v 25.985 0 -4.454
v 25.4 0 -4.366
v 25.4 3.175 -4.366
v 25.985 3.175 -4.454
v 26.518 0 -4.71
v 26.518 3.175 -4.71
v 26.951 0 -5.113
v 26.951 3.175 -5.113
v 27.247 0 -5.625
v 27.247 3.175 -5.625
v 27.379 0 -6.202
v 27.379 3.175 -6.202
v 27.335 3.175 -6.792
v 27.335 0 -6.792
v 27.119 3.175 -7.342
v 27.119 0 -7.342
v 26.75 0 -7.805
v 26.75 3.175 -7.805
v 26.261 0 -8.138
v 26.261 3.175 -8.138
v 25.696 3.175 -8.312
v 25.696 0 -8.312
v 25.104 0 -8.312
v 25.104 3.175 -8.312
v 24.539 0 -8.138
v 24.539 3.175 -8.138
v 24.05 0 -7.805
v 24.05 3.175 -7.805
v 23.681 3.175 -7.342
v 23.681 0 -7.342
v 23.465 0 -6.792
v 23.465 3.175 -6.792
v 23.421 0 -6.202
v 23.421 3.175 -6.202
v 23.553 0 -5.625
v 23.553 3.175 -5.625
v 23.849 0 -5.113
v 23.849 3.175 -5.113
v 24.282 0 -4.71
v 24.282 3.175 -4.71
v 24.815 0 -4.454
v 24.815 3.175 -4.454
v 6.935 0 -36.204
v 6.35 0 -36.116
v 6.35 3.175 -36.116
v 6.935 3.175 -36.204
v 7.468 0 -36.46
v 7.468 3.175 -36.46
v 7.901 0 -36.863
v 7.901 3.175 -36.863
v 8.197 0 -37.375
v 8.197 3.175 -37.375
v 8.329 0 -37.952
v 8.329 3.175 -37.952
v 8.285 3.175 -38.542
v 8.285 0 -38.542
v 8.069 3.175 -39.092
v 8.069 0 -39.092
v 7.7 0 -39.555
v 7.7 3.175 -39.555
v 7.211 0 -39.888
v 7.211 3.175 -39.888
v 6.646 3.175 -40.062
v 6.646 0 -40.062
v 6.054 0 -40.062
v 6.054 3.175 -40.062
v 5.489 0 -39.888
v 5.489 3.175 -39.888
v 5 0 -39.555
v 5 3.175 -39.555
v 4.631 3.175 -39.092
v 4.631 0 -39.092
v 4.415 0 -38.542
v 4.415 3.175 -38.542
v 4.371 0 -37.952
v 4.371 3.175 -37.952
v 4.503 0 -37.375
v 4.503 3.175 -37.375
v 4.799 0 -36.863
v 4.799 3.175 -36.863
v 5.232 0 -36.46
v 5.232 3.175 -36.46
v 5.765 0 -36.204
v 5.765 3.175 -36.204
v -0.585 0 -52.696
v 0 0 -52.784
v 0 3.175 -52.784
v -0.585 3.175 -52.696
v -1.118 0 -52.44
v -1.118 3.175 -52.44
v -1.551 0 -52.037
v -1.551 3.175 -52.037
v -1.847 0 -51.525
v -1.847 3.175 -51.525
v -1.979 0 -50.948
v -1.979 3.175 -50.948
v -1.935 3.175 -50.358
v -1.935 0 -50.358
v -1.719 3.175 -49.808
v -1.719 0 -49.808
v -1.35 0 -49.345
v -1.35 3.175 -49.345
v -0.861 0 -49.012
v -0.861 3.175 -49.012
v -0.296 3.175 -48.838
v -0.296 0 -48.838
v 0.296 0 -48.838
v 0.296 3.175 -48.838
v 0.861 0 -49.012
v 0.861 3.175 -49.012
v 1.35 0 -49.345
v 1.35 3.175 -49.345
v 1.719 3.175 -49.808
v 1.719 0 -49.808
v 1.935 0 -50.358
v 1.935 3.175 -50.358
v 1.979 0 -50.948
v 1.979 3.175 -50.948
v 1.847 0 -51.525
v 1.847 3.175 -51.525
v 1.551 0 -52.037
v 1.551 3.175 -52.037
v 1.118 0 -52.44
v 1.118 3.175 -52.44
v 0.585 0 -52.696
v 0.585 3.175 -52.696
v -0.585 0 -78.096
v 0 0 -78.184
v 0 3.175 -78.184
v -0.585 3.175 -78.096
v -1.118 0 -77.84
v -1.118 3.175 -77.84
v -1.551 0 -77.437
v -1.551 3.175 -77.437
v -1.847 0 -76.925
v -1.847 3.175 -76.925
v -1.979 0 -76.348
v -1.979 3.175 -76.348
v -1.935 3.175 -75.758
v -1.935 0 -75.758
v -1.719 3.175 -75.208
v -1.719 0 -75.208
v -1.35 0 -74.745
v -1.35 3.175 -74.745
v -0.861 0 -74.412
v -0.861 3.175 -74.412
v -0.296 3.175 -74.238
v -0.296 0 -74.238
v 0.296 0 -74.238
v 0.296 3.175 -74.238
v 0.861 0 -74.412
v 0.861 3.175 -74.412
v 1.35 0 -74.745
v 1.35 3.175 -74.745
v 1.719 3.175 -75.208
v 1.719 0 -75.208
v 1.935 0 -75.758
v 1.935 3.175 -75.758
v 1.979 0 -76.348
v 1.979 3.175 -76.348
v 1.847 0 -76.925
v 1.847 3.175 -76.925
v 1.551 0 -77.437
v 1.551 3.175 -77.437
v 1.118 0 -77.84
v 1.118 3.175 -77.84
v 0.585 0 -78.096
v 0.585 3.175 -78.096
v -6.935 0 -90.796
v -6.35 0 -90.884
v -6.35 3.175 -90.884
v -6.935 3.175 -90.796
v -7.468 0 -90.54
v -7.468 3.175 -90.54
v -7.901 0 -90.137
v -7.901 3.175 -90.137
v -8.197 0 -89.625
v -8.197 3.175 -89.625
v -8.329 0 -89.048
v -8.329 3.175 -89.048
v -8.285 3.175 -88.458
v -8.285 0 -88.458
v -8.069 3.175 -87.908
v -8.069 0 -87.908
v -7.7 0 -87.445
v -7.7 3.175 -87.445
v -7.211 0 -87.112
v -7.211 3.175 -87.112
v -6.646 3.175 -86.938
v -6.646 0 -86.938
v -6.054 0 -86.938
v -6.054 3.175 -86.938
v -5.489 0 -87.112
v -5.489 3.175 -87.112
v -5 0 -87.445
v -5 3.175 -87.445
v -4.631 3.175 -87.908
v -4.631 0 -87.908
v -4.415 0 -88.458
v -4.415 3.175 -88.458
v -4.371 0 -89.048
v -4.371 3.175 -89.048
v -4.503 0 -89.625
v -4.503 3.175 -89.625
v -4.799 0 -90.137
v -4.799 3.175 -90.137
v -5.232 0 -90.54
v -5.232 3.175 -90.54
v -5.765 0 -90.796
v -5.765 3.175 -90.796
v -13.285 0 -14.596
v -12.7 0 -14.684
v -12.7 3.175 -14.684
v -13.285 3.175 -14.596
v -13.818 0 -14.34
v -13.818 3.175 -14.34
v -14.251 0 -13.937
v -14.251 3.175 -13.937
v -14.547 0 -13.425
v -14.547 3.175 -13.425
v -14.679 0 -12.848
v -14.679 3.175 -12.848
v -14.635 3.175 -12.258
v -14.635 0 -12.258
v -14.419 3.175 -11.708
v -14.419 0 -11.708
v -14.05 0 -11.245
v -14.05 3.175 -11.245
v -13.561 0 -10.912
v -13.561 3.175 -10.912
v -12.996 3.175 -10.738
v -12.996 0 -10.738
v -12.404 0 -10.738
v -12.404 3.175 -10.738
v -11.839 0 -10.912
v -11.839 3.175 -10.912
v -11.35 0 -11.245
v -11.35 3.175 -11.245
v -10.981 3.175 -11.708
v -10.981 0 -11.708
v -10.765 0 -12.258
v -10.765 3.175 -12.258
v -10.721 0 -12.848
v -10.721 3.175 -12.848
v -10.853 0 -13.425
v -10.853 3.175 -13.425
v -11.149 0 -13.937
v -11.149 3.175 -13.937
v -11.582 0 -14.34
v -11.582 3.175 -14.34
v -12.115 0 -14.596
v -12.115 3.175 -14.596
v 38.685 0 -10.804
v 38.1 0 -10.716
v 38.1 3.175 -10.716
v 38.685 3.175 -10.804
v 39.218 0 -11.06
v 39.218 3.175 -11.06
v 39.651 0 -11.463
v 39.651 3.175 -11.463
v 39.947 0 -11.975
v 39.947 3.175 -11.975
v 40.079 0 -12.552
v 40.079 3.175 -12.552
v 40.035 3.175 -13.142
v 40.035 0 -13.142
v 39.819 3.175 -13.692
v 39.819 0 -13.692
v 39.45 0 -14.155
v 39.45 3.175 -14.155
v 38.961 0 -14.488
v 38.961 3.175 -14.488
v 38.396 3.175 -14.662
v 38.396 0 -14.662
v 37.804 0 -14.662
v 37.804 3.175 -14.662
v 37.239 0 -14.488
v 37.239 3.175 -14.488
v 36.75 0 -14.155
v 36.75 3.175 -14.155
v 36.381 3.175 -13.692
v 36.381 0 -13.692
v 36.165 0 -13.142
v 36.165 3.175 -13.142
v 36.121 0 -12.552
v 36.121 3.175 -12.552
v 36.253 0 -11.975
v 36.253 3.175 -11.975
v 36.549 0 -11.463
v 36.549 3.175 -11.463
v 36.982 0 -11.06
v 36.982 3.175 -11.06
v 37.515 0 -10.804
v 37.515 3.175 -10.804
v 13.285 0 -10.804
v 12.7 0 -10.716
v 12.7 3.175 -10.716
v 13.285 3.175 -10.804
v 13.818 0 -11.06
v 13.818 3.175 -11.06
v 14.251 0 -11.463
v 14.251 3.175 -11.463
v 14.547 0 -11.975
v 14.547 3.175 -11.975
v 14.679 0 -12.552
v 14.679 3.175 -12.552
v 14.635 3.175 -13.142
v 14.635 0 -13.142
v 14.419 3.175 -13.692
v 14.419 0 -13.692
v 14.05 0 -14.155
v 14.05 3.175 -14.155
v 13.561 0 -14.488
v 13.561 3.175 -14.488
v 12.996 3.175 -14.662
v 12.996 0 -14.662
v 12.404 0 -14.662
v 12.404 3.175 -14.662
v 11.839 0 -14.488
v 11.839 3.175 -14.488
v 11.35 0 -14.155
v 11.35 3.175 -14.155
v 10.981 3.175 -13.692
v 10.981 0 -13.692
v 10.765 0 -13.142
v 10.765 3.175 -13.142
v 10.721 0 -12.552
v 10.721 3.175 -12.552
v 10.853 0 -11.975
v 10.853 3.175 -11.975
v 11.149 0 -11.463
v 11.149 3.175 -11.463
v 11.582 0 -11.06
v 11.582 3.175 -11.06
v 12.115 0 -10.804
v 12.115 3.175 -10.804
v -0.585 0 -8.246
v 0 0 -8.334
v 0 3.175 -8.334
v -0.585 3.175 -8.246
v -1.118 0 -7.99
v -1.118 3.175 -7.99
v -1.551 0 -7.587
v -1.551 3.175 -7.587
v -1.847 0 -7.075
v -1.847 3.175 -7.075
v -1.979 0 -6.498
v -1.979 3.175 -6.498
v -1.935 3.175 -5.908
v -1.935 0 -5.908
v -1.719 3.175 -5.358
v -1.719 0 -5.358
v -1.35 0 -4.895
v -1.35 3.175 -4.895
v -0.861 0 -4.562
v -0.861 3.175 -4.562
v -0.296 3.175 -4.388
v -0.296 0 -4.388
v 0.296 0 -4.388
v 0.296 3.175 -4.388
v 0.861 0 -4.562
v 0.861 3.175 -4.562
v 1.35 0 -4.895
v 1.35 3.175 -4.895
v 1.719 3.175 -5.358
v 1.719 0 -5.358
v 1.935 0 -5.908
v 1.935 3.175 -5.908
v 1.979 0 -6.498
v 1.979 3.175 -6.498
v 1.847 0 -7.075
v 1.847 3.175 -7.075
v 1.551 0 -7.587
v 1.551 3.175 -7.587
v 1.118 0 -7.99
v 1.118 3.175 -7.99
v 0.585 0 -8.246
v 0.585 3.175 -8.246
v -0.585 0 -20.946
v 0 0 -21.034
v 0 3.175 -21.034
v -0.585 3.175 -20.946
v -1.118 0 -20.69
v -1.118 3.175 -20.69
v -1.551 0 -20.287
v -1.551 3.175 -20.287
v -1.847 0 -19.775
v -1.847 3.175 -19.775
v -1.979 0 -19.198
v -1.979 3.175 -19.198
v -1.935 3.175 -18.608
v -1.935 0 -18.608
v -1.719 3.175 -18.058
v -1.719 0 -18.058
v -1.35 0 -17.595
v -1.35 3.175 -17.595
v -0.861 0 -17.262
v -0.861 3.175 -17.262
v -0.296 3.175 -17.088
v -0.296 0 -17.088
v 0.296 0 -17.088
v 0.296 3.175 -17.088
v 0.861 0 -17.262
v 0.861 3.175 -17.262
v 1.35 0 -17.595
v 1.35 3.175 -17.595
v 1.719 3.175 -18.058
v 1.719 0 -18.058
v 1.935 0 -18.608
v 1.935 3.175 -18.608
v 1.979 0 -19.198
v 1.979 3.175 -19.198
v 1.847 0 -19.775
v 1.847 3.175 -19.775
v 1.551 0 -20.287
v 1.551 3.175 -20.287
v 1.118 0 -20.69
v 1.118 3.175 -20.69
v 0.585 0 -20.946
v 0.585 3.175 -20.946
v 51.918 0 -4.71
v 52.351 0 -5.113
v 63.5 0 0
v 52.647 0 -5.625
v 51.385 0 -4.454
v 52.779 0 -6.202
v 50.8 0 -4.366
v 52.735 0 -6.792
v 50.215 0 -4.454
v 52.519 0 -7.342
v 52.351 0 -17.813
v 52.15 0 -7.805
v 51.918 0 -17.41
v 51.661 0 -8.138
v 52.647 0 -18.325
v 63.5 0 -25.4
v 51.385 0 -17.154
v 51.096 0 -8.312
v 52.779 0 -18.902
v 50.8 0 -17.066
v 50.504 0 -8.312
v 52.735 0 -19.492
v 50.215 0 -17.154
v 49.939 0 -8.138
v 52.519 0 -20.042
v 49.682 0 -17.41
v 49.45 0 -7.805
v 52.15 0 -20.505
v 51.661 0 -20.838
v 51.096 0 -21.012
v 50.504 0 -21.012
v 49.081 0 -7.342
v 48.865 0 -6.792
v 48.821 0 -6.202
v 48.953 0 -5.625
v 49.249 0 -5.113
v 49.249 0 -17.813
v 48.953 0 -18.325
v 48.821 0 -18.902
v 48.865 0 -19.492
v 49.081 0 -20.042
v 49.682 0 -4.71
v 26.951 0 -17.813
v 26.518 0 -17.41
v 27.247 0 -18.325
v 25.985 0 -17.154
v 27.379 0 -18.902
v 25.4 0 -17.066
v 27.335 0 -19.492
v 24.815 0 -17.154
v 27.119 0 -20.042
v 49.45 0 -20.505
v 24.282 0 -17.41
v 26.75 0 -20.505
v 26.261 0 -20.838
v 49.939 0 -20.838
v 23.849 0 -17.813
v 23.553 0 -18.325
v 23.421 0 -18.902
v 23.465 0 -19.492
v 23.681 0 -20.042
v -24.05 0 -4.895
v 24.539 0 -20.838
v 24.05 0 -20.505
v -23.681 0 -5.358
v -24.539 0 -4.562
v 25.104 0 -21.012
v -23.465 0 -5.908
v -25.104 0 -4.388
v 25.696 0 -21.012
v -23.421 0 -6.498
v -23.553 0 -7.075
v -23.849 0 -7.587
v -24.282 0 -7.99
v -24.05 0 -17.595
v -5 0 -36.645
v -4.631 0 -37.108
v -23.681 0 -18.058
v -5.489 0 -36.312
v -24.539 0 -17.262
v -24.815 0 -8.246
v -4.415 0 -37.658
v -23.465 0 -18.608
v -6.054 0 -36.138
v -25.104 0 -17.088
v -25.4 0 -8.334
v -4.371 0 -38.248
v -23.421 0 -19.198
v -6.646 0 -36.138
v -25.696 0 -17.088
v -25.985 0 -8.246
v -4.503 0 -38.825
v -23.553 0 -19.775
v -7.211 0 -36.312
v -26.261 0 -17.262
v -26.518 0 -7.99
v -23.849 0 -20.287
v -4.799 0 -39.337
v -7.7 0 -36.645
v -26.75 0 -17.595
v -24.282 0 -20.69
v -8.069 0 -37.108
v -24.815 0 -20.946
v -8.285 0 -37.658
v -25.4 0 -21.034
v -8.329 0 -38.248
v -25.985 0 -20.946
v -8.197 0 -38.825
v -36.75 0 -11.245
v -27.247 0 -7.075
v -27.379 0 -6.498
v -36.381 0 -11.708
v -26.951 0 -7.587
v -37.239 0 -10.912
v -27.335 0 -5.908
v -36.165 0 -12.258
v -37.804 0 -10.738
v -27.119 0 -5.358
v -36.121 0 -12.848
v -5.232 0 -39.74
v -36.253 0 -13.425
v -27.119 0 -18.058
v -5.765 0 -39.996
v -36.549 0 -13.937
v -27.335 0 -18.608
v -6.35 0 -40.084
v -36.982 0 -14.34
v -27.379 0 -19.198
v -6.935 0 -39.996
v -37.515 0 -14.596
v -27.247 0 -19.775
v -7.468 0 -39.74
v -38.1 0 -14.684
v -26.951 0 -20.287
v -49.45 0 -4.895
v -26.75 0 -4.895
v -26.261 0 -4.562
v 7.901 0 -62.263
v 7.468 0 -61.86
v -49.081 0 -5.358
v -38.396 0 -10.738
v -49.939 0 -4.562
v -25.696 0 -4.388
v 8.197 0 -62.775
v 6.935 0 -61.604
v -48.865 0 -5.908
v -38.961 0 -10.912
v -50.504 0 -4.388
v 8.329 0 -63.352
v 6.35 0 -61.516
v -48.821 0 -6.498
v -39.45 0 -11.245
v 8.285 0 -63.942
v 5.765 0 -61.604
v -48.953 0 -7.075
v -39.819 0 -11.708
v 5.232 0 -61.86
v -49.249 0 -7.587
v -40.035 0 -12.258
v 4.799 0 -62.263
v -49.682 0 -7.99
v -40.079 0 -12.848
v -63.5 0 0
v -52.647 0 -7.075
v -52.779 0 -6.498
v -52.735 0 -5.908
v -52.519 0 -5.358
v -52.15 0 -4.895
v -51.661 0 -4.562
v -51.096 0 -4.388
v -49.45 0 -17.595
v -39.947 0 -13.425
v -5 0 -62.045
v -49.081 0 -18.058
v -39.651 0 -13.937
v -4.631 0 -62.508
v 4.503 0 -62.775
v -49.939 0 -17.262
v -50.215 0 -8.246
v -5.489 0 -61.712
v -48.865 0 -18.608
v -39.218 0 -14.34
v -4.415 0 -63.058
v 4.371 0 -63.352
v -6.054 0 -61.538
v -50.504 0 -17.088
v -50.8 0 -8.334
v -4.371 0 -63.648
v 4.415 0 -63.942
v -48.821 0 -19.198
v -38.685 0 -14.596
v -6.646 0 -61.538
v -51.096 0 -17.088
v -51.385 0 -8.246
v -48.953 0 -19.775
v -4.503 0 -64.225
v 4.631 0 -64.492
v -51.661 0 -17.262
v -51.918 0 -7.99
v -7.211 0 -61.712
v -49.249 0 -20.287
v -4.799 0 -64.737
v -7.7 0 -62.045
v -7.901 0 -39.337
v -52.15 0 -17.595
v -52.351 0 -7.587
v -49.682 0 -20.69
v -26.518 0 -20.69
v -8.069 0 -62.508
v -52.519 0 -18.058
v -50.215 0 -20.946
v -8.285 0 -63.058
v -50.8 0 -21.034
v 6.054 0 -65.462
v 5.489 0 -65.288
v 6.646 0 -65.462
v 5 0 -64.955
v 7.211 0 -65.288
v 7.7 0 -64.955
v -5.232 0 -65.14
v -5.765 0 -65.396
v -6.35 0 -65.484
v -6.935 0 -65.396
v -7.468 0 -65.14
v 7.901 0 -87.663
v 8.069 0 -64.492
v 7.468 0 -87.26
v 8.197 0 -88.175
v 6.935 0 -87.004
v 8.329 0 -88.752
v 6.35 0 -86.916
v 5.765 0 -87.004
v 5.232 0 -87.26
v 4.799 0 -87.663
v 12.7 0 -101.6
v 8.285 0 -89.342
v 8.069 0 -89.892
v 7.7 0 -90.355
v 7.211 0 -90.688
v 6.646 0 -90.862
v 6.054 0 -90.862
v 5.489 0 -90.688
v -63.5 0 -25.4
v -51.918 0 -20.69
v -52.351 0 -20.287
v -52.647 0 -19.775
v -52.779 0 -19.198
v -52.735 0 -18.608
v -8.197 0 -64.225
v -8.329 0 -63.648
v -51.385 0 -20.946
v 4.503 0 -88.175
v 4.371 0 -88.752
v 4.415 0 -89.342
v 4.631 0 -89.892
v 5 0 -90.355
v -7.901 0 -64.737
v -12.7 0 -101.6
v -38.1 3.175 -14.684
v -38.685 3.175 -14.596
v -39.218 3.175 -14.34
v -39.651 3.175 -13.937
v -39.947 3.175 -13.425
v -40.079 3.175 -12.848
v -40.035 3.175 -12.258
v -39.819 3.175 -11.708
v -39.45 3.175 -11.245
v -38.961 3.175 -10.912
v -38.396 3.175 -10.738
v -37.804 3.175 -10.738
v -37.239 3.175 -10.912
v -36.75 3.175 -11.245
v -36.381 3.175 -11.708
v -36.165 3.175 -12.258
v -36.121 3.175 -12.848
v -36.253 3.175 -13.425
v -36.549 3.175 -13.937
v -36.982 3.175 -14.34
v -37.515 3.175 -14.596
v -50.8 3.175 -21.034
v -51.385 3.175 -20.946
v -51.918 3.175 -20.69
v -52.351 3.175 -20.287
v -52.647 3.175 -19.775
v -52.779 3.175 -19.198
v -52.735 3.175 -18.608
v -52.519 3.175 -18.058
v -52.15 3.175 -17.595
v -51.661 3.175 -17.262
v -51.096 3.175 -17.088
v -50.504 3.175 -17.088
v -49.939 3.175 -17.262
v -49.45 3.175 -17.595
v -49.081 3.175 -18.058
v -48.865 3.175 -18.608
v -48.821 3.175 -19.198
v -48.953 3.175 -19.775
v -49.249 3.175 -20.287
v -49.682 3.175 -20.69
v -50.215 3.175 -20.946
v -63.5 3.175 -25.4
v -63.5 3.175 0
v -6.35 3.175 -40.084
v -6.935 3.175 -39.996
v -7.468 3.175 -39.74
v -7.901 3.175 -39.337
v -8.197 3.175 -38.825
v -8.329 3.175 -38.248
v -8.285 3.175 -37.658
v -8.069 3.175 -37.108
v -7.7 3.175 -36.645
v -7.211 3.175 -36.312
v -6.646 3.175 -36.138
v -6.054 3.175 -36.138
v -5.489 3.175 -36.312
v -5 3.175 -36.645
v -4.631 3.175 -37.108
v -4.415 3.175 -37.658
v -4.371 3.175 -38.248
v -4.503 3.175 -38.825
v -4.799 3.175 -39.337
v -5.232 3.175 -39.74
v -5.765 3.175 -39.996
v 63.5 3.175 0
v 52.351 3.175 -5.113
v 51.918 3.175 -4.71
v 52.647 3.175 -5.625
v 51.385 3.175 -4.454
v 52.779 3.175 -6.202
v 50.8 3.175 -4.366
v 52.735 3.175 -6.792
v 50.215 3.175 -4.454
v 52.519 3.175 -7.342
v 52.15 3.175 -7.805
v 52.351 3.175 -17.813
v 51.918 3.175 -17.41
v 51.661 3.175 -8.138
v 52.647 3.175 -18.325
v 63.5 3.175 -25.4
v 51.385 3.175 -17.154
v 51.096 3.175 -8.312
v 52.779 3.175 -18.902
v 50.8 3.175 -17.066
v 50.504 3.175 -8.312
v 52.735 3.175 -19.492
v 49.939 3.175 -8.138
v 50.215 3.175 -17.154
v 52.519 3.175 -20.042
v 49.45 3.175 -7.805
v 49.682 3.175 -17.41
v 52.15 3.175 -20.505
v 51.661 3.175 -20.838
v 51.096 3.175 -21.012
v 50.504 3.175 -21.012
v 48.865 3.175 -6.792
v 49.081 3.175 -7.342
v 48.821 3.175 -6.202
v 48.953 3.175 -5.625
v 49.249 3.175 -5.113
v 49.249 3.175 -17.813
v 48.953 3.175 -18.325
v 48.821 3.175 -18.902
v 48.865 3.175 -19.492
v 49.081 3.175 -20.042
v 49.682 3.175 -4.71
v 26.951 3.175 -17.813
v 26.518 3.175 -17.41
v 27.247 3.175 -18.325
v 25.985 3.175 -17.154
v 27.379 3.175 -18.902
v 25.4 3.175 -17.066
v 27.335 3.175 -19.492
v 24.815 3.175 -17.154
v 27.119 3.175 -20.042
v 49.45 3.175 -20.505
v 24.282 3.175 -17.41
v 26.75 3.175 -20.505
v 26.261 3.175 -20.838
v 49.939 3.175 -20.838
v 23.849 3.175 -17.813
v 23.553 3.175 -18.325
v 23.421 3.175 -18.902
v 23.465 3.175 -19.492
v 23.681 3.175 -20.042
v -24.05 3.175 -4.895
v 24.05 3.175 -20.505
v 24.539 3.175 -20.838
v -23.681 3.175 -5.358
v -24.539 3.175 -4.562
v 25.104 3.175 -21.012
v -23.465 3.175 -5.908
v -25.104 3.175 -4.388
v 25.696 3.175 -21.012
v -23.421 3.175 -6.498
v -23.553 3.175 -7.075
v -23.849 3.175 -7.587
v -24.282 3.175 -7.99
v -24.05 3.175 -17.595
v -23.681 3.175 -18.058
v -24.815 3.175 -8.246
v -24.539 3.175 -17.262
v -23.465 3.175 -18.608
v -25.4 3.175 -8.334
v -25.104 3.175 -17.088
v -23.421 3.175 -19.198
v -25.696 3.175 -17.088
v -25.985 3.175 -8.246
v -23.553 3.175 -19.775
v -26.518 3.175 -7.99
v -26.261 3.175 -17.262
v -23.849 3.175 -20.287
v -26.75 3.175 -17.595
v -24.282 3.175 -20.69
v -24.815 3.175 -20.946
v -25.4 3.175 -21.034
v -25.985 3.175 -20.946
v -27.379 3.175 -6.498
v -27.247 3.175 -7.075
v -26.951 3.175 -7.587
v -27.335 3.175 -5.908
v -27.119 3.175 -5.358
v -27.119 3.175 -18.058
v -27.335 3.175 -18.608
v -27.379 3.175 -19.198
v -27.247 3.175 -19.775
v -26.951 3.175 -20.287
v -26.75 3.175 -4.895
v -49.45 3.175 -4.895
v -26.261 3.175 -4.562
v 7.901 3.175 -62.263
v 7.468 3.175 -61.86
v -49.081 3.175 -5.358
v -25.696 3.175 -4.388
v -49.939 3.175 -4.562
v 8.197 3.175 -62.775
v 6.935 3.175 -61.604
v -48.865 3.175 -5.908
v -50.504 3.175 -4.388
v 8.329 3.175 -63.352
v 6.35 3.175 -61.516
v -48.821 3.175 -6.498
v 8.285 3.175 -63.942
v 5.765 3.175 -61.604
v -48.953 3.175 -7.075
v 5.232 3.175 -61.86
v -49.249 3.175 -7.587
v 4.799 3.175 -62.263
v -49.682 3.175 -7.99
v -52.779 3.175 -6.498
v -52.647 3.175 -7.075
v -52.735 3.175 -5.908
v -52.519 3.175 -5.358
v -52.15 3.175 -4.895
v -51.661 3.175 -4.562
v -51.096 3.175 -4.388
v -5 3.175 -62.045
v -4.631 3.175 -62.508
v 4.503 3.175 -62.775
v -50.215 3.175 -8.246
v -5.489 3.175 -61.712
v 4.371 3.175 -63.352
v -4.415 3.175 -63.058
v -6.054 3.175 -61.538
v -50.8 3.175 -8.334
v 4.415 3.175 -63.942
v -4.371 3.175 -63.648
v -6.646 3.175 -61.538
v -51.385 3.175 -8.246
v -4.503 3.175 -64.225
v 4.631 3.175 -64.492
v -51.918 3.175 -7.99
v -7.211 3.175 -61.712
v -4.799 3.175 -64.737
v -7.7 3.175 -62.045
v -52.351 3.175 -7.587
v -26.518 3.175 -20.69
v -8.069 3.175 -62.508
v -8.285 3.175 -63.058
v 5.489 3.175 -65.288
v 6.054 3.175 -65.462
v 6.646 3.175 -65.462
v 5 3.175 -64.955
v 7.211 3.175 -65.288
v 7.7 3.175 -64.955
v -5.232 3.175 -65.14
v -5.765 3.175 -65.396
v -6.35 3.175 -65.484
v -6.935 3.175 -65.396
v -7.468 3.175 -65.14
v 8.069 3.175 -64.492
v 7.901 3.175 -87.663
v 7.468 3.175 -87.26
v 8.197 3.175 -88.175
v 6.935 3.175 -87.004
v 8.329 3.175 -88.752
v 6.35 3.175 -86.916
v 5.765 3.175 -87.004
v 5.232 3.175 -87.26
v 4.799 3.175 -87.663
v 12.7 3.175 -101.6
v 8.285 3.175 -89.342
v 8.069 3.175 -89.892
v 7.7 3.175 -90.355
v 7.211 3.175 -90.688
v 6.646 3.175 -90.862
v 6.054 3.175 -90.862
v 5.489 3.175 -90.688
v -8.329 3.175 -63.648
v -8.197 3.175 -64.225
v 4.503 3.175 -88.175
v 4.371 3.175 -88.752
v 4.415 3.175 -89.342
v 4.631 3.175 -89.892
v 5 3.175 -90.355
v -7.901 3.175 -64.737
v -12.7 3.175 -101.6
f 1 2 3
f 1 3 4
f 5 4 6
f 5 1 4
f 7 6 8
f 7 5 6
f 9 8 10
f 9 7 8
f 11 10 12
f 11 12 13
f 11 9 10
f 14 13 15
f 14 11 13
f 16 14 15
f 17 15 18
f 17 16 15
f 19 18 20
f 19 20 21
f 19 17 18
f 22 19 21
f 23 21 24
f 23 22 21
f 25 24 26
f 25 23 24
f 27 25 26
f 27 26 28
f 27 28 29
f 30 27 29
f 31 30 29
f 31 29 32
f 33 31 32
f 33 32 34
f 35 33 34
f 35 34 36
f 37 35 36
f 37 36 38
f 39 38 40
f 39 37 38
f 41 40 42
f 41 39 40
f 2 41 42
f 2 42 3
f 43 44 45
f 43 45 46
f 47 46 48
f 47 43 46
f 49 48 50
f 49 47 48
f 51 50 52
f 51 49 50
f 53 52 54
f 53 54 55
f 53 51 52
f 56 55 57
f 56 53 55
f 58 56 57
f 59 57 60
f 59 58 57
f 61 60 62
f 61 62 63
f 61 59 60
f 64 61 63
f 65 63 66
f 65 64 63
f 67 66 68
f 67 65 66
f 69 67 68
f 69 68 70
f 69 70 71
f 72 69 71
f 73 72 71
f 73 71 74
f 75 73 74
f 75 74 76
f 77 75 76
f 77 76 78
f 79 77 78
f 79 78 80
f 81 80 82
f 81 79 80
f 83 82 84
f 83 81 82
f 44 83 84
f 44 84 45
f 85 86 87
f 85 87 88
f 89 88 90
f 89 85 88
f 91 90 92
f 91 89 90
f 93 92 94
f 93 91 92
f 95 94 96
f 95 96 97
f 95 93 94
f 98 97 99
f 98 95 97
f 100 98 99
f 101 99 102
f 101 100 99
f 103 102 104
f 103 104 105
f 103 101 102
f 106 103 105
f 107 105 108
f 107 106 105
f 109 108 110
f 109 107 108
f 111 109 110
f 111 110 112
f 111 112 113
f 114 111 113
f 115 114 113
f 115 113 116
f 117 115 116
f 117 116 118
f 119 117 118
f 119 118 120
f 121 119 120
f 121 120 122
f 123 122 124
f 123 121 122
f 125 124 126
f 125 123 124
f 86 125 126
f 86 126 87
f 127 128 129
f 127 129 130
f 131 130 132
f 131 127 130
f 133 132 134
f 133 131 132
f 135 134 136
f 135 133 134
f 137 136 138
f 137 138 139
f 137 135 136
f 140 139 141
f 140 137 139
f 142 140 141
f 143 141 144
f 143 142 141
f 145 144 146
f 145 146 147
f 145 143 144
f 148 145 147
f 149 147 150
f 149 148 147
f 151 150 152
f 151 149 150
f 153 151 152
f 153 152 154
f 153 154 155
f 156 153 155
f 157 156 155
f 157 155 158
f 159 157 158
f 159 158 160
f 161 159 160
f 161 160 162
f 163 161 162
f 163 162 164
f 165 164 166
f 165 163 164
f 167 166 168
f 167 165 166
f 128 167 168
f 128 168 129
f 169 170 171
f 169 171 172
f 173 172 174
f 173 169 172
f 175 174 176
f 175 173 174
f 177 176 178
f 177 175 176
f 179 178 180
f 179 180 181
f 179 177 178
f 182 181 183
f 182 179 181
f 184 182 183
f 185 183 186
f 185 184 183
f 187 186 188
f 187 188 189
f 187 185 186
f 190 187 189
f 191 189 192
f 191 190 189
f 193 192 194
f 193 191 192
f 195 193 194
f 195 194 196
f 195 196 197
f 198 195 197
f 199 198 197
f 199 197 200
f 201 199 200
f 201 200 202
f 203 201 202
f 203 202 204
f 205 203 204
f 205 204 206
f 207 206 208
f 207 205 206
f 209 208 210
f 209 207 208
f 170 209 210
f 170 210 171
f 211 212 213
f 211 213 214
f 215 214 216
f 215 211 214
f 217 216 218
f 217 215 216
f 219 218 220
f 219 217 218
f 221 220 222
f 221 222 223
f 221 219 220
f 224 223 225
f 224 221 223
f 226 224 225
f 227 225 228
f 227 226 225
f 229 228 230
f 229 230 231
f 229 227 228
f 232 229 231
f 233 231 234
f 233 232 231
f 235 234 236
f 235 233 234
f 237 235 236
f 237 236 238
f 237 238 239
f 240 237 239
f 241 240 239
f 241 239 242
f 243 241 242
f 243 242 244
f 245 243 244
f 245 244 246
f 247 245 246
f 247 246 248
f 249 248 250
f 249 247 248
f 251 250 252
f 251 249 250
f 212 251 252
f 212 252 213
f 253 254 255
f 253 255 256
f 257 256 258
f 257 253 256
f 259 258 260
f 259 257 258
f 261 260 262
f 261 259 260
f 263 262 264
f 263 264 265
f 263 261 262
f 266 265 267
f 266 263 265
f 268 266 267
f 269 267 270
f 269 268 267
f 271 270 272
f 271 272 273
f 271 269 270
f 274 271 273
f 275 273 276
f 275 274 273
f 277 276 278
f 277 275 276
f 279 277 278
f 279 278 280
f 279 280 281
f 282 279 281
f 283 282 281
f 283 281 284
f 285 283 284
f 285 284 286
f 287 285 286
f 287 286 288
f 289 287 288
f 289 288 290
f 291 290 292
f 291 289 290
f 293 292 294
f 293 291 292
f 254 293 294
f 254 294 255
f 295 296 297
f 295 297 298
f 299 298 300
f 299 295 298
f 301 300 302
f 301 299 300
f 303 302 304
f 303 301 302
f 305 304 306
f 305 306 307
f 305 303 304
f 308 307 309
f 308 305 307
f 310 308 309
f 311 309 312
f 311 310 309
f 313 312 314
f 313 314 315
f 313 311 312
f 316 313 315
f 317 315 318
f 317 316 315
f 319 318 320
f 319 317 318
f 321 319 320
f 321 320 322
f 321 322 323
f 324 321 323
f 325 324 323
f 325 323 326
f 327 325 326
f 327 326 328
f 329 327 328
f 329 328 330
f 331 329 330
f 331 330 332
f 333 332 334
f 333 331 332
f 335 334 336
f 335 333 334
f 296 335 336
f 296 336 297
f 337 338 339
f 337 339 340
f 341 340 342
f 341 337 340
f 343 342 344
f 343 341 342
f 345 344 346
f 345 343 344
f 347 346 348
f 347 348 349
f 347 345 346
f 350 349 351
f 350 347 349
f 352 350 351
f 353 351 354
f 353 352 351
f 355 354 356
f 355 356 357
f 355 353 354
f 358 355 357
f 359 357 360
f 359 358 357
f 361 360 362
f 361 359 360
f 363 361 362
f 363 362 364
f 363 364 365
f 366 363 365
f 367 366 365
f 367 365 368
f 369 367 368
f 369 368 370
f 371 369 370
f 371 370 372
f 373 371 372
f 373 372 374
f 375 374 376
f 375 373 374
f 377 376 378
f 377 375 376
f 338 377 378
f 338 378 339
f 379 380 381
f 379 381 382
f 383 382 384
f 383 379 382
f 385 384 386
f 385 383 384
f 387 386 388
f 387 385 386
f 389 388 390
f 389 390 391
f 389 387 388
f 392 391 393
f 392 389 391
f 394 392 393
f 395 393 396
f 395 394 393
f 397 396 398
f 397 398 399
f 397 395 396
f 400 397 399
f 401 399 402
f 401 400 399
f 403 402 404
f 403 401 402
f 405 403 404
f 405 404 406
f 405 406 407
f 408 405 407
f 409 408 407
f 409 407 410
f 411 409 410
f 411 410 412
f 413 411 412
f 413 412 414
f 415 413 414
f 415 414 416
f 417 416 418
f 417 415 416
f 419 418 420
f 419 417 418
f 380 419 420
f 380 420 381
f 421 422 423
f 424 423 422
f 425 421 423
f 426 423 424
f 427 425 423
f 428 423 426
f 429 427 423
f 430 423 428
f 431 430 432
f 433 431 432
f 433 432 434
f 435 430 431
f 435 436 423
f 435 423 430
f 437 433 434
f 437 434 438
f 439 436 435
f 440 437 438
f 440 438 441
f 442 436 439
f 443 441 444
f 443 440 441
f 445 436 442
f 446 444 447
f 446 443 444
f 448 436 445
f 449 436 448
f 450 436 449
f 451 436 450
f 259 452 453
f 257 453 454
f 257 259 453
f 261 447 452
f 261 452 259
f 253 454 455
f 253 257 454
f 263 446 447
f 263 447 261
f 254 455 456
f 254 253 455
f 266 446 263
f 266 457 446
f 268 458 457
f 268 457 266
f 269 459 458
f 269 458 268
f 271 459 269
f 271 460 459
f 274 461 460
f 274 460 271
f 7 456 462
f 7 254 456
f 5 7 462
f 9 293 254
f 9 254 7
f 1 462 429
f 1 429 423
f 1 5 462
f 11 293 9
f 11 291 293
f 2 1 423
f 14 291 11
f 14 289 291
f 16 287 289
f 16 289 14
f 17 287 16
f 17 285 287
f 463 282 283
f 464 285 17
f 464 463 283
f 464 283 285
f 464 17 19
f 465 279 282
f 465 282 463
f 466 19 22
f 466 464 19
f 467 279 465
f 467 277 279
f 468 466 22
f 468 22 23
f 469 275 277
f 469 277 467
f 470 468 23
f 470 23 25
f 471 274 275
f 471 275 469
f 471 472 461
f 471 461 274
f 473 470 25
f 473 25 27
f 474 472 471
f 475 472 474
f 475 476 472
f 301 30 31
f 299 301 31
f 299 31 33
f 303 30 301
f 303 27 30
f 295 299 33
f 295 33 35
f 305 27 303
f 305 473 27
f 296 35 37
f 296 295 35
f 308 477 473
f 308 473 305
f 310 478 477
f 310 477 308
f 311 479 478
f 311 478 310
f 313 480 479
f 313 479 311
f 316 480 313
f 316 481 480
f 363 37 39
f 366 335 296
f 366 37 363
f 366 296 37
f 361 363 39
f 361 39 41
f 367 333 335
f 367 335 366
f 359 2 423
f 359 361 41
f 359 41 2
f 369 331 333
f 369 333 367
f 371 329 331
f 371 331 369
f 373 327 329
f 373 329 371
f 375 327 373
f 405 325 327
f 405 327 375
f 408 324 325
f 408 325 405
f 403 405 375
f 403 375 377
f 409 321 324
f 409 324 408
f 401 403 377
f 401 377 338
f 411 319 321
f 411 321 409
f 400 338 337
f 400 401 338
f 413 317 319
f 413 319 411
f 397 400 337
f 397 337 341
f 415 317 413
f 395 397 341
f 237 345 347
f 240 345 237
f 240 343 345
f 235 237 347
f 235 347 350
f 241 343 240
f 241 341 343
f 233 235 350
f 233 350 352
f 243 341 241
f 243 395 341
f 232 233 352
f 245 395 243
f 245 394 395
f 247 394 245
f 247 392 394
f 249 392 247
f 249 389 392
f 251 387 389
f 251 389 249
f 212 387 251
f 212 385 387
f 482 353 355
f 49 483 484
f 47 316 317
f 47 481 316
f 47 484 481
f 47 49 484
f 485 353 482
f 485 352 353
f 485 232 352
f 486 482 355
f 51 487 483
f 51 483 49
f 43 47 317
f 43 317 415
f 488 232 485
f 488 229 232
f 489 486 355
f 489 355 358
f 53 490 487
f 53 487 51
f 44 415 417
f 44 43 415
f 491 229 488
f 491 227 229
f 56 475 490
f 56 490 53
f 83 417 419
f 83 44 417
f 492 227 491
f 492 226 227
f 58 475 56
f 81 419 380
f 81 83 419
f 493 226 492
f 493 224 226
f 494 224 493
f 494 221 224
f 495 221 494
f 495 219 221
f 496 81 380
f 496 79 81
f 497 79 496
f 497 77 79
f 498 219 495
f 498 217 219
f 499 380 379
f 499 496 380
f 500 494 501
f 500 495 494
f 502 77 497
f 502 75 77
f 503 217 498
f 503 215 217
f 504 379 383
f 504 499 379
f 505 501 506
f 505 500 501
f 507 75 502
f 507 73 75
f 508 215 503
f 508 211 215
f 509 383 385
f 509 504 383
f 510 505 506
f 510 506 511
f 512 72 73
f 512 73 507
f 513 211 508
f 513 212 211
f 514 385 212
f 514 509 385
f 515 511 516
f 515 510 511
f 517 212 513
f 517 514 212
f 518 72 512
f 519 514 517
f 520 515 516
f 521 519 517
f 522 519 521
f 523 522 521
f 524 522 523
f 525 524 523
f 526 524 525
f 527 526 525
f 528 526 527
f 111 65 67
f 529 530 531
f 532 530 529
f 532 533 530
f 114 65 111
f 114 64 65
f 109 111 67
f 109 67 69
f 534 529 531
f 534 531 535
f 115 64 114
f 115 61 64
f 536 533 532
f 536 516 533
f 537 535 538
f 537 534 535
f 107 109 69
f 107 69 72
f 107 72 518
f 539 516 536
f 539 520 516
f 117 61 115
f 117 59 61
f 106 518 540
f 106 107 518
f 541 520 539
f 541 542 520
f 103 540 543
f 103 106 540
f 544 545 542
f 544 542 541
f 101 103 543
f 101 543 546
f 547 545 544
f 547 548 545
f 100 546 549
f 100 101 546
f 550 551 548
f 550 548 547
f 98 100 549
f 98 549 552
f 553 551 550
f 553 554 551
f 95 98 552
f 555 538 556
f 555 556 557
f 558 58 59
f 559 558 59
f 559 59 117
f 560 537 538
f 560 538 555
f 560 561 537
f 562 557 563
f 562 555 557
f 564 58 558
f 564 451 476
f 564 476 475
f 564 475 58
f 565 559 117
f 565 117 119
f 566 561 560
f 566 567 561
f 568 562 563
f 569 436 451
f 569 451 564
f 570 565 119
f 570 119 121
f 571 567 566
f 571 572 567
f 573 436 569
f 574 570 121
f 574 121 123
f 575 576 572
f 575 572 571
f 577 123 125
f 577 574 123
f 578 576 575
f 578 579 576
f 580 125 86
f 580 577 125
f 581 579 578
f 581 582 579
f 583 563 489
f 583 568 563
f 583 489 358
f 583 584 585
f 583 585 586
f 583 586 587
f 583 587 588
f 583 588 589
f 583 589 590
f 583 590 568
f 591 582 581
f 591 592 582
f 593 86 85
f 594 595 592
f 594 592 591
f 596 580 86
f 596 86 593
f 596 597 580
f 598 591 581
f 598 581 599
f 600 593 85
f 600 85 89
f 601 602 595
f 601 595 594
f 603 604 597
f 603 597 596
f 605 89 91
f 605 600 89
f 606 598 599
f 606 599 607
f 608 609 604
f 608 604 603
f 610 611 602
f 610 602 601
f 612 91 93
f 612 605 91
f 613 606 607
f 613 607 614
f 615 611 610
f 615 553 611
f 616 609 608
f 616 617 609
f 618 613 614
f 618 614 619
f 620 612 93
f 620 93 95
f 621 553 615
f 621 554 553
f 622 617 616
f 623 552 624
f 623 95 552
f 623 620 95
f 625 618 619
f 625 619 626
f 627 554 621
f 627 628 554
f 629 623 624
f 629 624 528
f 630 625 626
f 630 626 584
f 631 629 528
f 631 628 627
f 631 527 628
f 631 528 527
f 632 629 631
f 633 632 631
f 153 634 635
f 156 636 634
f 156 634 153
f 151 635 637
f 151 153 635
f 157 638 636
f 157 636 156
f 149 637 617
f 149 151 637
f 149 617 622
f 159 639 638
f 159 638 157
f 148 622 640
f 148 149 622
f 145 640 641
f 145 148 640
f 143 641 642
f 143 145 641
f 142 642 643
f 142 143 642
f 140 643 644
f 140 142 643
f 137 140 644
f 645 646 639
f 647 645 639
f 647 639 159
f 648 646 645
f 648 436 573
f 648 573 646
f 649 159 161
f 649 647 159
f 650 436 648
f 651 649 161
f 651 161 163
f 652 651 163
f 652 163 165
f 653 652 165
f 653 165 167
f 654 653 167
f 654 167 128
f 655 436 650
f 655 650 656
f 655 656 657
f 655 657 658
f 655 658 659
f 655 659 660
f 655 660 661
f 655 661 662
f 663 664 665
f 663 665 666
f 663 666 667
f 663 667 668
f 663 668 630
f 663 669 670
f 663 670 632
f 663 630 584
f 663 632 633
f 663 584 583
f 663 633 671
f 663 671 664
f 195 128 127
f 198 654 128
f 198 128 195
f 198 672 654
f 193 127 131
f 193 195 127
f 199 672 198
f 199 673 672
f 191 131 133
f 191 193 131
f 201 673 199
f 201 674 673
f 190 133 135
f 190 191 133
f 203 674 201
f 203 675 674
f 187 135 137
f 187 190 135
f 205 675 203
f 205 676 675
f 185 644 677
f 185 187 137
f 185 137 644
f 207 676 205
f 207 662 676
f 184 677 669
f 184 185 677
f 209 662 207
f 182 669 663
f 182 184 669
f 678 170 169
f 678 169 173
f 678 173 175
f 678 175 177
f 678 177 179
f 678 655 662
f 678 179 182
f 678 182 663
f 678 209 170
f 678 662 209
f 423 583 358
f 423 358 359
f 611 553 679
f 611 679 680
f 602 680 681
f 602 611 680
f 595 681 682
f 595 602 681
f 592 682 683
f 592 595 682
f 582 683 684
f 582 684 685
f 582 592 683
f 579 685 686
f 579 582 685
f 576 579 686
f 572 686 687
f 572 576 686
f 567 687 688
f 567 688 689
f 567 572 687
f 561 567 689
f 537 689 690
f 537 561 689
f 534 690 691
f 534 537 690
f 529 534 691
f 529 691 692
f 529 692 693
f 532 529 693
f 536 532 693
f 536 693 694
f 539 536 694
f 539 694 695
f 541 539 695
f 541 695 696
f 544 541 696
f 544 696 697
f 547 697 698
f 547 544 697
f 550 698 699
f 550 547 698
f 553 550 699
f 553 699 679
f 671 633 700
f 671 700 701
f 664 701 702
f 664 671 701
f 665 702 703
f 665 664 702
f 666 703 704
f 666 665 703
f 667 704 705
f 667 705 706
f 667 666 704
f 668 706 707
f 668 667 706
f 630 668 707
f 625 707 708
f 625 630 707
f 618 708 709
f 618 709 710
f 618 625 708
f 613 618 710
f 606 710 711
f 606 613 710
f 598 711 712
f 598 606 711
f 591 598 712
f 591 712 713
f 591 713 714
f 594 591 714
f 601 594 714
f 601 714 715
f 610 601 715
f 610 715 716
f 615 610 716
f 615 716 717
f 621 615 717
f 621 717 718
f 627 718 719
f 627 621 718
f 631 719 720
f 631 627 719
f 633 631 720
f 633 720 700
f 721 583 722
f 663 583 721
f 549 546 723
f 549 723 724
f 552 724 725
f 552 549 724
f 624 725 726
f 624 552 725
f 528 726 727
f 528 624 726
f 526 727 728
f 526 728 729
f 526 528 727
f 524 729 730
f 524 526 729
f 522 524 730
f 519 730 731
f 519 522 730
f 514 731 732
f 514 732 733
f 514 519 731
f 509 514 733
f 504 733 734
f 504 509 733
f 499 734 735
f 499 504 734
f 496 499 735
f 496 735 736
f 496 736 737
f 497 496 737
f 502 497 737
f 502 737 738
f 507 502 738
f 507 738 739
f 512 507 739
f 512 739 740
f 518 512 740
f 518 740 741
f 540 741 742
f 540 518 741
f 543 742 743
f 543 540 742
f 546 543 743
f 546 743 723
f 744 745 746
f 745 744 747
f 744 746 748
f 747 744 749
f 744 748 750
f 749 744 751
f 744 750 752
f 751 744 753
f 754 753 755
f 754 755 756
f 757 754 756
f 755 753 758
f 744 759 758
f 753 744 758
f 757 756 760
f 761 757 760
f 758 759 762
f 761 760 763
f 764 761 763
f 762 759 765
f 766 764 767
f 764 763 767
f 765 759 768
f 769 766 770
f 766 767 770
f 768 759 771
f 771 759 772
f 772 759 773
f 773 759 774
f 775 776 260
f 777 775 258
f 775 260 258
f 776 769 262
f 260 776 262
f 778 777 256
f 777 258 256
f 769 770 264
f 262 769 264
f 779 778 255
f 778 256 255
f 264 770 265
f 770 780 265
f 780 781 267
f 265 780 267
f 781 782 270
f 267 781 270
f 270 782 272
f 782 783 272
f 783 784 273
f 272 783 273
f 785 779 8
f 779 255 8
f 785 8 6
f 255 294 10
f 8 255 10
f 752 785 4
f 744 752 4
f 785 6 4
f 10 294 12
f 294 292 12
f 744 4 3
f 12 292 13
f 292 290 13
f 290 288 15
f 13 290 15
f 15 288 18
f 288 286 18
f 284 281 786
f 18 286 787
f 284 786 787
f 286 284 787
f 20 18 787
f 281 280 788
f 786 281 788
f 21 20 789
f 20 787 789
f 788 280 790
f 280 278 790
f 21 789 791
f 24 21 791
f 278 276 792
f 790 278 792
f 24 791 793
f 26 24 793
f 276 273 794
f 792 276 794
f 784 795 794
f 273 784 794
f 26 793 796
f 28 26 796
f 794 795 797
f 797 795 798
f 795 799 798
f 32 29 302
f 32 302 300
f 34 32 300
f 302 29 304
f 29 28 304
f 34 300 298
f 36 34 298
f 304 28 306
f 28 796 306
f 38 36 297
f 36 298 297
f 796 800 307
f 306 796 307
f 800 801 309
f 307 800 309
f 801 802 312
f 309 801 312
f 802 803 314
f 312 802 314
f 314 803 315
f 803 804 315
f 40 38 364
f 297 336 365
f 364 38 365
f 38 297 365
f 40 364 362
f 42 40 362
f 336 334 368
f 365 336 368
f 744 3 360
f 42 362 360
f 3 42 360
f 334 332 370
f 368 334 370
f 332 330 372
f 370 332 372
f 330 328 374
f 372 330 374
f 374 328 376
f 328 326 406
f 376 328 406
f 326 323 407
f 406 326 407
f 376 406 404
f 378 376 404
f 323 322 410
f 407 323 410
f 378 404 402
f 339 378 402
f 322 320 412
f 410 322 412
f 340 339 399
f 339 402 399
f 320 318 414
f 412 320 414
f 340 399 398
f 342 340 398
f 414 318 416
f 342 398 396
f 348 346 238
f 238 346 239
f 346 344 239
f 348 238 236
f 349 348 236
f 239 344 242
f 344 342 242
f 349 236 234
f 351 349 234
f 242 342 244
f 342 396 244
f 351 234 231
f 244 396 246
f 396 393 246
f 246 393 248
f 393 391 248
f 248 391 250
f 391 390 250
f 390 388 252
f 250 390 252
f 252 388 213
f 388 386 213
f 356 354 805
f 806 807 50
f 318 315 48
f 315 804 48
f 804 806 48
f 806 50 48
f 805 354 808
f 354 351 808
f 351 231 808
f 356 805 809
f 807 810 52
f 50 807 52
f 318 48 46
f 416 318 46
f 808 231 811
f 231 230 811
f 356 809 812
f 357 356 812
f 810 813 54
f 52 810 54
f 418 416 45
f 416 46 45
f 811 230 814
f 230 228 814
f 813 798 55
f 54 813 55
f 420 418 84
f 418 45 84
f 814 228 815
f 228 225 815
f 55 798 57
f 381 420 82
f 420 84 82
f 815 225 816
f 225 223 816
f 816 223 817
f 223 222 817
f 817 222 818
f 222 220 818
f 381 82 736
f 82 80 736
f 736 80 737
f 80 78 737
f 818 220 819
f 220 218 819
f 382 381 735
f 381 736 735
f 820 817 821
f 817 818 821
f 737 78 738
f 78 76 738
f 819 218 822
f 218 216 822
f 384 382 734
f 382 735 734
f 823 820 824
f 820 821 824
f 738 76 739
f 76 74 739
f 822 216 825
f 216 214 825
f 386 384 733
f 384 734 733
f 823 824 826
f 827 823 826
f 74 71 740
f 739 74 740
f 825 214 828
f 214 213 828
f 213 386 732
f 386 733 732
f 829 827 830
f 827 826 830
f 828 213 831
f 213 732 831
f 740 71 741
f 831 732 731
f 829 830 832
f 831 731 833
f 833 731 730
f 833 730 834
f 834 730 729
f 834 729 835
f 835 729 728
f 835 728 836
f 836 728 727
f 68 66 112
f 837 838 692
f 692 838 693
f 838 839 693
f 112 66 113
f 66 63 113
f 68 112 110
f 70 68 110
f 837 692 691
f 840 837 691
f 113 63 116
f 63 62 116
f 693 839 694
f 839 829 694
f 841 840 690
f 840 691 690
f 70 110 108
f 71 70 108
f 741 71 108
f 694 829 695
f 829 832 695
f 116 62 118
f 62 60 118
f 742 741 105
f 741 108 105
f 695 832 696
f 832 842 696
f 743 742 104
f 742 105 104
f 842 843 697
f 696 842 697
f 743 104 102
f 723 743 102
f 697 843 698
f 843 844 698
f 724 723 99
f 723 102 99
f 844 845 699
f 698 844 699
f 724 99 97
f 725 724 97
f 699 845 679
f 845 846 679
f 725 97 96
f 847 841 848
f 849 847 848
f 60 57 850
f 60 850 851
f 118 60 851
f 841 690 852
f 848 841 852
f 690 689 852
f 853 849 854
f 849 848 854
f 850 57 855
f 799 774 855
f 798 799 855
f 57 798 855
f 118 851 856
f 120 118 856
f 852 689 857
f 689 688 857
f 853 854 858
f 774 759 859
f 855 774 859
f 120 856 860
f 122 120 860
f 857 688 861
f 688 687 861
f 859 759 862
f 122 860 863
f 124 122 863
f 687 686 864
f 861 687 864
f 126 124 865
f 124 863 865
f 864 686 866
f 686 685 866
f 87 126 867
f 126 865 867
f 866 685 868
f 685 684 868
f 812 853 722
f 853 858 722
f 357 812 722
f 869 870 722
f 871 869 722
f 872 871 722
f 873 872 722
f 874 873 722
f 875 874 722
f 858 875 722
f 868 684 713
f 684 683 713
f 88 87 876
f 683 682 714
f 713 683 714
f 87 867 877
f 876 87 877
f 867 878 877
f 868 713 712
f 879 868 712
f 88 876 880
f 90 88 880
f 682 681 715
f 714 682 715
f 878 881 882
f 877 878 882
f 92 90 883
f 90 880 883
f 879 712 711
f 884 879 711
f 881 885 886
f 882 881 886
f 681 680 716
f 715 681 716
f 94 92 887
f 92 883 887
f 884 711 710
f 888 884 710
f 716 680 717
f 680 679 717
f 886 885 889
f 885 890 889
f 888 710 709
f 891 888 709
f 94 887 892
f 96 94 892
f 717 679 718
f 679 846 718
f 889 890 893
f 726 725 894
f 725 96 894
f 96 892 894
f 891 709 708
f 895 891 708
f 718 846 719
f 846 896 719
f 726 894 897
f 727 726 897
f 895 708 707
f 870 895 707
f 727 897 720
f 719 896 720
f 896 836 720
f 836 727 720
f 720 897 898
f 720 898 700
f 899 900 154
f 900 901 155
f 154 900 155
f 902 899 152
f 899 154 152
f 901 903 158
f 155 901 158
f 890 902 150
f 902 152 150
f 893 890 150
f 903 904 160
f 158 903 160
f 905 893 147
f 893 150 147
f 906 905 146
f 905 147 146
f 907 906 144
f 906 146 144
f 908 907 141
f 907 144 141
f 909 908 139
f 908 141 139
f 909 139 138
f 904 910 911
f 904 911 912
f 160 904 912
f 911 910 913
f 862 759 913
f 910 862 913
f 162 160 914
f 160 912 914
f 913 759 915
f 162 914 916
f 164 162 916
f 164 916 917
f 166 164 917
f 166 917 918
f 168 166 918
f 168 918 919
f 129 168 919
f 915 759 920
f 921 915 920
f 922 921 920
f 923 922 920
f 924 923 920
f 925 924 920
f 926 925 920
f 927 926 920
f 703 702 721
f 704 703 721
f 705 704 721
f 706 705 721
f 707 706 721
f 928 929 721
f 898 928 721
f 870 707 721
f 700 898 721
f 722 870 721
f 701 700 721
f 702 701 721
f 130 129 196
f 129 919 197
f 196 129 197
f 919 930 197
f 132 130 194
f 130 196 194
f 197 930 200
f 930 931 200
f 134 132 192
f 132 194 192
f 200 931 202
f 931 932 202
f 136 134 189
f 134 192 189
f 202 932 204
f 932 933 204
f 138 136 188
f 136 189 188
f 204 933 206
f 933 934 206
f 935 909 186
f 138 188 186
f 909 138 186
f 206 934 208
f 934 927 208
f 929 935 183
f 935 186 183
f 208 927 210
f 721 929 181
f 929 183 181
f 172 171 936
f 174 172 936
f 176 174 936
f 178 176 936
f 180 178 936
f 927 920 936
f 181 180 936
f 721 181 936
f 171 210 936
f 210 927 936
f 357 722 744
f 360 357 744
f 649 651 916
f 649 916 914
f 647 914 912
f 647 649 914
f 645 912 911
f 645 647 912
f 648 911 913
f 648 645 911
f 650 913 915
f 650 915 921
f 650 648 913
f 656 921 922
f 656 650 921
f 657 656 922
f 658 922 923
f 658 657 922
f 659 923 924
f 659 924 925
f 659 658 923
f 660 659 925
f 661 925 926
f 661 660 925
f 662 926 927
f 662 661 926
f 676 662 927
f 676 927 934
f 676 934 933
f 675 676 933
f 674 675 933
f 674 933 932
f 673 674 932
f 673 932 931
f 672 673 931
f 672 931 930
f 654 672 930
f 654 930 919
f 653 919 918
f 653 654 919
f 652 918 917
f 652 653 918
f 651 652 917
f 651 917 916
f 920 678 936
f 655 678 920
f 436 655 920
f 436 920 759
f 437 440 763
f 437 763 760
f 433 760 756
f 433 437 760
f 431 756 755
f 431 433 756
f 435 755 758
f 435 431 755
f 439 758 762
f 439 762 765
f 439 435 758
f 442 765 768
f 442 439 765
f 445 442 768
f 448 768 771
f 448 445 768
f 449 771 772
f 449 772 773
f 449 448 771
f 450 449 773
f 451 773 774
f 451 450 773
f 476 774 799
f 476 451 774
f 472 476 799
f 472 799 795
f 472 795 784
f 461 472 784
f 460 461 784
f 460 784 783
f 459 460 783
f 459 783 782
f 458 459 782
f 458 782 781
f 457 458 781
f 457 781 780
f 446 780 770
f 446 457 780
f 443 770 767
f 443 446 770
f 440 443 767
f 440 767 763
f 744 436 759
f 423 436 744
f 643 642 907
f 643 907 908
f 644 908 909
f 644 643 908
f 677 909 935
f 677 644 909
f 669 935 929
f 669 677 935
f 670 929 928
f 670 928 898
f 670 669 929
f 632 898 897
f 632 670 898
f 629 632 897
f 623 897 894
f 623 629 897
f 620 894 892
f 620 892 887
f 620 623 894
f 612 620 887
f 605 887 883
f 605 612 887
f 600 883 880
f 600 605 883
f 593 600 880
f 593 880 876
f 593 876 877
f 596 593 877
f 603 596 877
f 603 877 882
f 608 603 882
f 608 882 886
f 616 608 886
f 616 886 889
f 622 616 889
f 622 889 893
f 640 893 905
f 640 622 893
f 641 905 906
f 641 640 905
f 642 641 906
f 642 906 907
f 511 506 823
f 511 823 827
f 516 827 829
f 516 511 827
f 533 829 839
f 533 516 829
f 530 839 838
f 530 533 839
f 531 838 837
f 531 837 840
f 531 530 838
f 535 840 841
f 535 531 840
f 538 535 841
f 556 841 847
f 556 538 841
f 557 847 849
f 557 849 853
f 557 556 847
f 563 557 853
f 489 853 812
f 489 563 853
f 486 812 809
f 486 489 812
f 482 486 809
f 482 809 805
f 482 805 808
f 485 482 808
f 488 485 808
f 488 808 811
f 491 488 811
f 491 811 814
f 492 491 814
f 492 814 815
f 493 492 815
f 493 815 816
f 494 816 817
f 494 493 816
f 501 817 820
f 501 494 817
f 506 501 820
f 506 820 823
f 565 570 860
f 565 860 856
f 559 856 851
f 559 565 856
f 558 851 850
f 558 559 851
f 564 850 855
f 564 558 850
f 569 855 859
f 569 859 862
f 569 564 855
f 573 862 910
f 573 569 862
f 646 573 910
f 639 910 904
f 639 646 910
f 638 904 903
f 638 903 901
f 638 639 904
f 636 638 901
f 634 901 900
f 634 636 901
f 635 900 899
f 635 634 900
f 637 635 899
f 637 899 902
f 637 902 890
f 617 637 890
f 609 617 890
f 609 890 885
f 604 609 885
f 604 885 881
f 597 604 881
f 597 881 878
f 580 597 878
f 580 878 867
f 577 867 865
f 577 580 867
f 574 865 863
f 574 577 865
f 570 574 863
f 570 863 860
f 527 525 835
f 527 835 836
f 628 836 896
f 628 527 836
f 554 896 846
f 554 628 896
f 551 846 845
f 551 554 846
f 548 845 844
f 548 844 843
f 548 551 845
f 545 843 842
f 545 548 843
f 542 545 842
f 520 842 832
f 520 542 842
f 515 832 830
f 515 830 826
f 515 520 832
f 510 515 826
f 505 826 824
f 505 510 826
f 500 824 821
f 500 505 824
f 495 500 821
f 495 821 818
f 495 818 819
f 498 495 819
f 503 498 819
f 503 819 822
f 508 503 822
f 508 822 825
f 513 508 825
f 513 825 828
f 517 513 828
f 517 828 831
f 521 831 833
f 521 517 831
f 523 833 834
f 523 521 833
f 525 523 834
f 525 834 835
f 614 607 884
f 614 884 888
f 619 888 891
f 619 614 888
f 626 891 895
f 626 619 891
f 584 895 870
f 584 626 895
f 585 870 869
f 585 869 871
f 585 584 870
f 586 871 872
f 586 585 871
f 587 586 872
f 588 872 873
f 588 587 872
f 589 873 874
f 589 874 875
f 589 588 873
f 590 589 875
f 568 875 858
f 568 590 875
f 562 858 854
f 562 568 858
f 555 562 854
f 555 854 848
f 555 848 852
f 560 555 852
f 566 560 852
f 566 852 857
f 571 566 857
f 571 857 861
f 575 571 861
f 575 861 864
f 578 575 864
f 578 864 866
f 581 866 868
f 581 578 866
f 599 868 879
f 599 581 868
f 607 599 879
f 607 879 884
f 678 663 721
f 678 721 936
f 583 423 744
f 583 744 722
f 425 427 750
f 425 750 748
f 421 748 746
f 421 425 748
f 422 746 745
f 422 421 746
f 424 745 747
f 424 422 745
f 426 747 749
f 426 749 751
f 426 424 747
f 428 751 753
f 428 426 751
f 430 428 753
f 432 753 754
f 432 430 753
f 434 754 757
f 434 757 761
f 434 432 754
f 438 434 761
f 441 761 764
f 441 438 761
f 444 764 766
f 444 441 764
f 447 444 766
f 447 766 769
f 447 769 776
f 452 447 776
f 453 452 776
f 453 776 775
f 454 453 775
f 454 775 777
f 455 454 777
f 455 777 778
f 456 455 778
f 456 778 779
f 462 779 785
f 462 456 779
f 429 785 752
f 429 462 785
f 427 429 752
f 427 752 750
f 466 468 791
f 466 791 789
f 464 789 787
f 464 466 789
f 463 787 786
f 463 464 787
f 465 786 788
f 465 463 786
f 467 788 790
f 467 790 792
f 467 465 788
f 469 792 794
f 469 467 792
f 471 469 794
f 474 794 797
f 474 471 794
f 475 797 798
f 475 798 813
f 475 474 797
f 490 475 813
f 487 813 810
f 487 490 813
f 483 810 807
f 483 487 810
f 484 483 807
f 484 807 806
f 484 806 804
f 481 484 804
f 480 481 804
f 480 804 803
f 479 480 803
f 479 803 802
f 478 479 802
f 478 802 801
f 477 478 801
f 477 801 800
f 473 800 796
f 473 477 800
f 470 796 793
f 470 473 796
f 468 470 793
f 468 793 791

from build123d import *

# Parameters (mm, degrees)
SKETCH1_R           = 1.984375
BOSS_EXTRUDE1_DEPTH = 3.175


with BuildPart() as part:
    # Sketch1 → Boss-Extrude1 (new body)
    with BuildSketch(Plane(origin=(0, 0, 0), x_dir=(1, 0, 0), z_dir=(0, 1, 0))):
        Polygon((-12.7, 101.6), (12.7, 101.6), (63.5, 25.4), (63.5, 0), (-63.5, 0), (-63.5, 25.4), align=None)
        with Locations(Location((6.35, 88.9, 0), (0, 0, 270))):
            Circle(SKETCH1_R, mode=Mode.SUBTRACT)
        with Locations(Location((6.35, 63.5, 0), (0, 0, 270))):
            Circle(SKETCH1_R, mode=Mode.SUBTRACT)
        with Locations(Location((6.35, 38.1, 0), (0, 0, 270))):
            Circle(SKETCH1_R, mode=Mode.SUBTRACT)
        with Locations(Location((12.7, 12.7, 0), (0, 0, 270))):
            Circle(SKETCH1_R, mode=Mode.SUBTRACT)
        with Locations(Location((25.4, 6.35, 0), (0, 0, 270))):
            Circle(SKETCH1_R, mode=Mode.SUBTRACT)
        with Locations(Location((25.4, 19.05, 0), (0, 0, 270))):
            Circle(SKETCH1_R, mode=Mode.SUBTRACT)
        with Locations(Location((38.1, 12.7, 0), (0, 0, 270))):
            Circle(SKETCH1_R, mode=Mode.SUBTRACT)
        with Locations(Location((50.8, 6.35, 0), (0, 0, 270))):
            Circle(SKETCH1_R, mode=Mode.SUBTRACT)
        with Locations(Location((50.8, 19.05, 0), (0, 0, 270))):
            Circle(SKETCH1_R, mode=Mode.SUBTRACT)
        with Locations(Location((0, 76.2, 0), (0, 0, 90))):
            Circle(SKETCH1_R, mode=Mode.SUBTRACT)
        with Locations(Location((0, 50.8, 0), (0, 0, 90))):
            Circle(SKETCH1_R, mode=Mode.SUBTRACT)
        with Locations(Location((0, 19.05, 0), (0, 0, 90))):
            Circle(SKETCH1_R, mode=Mode.SUBTRACT)
        with Locations(Location((0, 6.35, 0), (0, 0, 90))):
            Circle(SKETCH1_R, mode=Mode.SUBTRACT)
        with Locations(Location((-50.8, 19.05, 0), (0, 0, 90))):
            Circle(SKETCH1_R, mode=Mode.SUBTRACT)
        with Locations(Location((-50.8, 6.35, 0), (0, 0, 90))):
            Circle(SKETCH1_R, mode=Mode.SUBTRACT)
        with Locations(Location((-38.1, 12.7, 0), (0, 0, 90))):
            Circle(SKETCH1_R, mode=Mode.SUBTRACT)
        with Locations(Location((-25.4, 19.05, 0), (0, 0, 90))):
            Circle(SKETCH1_R, mode=Mode.SUBTRACT)
        with Locations(Location((-25.4, 6.35, 0), (0, 0, 90))):
            Circle(SKETCH1_R, mode=Mode.SUBTRACT)
        with Locations(Location((-12.7, 12.7, 0), (0, 0, 90))):
            Circle(SKETCH1_R, mode=Mode.SUBTRACT)
        with Locations(Location((-6.35, 38.1, 0), (0, 0, 90))):
            Circle(SKETCH1_R, mode=Mode.SUBTRACT)
        with Locations(Location((-6.35, 63.5, 0), (0, 0, 90))):
            Circle(SKETCH1_R, mode=Mode.SUBTRACT)
        with Locations(Location((-6.35, 88.9, 0), (0, 0, 90))):
            Circle(SKETCH1_R, mode=Mode.SUBTRACT)
    extrude(amount=BOSS_EXTRUDE1_DEPTH)


solid = part.part
